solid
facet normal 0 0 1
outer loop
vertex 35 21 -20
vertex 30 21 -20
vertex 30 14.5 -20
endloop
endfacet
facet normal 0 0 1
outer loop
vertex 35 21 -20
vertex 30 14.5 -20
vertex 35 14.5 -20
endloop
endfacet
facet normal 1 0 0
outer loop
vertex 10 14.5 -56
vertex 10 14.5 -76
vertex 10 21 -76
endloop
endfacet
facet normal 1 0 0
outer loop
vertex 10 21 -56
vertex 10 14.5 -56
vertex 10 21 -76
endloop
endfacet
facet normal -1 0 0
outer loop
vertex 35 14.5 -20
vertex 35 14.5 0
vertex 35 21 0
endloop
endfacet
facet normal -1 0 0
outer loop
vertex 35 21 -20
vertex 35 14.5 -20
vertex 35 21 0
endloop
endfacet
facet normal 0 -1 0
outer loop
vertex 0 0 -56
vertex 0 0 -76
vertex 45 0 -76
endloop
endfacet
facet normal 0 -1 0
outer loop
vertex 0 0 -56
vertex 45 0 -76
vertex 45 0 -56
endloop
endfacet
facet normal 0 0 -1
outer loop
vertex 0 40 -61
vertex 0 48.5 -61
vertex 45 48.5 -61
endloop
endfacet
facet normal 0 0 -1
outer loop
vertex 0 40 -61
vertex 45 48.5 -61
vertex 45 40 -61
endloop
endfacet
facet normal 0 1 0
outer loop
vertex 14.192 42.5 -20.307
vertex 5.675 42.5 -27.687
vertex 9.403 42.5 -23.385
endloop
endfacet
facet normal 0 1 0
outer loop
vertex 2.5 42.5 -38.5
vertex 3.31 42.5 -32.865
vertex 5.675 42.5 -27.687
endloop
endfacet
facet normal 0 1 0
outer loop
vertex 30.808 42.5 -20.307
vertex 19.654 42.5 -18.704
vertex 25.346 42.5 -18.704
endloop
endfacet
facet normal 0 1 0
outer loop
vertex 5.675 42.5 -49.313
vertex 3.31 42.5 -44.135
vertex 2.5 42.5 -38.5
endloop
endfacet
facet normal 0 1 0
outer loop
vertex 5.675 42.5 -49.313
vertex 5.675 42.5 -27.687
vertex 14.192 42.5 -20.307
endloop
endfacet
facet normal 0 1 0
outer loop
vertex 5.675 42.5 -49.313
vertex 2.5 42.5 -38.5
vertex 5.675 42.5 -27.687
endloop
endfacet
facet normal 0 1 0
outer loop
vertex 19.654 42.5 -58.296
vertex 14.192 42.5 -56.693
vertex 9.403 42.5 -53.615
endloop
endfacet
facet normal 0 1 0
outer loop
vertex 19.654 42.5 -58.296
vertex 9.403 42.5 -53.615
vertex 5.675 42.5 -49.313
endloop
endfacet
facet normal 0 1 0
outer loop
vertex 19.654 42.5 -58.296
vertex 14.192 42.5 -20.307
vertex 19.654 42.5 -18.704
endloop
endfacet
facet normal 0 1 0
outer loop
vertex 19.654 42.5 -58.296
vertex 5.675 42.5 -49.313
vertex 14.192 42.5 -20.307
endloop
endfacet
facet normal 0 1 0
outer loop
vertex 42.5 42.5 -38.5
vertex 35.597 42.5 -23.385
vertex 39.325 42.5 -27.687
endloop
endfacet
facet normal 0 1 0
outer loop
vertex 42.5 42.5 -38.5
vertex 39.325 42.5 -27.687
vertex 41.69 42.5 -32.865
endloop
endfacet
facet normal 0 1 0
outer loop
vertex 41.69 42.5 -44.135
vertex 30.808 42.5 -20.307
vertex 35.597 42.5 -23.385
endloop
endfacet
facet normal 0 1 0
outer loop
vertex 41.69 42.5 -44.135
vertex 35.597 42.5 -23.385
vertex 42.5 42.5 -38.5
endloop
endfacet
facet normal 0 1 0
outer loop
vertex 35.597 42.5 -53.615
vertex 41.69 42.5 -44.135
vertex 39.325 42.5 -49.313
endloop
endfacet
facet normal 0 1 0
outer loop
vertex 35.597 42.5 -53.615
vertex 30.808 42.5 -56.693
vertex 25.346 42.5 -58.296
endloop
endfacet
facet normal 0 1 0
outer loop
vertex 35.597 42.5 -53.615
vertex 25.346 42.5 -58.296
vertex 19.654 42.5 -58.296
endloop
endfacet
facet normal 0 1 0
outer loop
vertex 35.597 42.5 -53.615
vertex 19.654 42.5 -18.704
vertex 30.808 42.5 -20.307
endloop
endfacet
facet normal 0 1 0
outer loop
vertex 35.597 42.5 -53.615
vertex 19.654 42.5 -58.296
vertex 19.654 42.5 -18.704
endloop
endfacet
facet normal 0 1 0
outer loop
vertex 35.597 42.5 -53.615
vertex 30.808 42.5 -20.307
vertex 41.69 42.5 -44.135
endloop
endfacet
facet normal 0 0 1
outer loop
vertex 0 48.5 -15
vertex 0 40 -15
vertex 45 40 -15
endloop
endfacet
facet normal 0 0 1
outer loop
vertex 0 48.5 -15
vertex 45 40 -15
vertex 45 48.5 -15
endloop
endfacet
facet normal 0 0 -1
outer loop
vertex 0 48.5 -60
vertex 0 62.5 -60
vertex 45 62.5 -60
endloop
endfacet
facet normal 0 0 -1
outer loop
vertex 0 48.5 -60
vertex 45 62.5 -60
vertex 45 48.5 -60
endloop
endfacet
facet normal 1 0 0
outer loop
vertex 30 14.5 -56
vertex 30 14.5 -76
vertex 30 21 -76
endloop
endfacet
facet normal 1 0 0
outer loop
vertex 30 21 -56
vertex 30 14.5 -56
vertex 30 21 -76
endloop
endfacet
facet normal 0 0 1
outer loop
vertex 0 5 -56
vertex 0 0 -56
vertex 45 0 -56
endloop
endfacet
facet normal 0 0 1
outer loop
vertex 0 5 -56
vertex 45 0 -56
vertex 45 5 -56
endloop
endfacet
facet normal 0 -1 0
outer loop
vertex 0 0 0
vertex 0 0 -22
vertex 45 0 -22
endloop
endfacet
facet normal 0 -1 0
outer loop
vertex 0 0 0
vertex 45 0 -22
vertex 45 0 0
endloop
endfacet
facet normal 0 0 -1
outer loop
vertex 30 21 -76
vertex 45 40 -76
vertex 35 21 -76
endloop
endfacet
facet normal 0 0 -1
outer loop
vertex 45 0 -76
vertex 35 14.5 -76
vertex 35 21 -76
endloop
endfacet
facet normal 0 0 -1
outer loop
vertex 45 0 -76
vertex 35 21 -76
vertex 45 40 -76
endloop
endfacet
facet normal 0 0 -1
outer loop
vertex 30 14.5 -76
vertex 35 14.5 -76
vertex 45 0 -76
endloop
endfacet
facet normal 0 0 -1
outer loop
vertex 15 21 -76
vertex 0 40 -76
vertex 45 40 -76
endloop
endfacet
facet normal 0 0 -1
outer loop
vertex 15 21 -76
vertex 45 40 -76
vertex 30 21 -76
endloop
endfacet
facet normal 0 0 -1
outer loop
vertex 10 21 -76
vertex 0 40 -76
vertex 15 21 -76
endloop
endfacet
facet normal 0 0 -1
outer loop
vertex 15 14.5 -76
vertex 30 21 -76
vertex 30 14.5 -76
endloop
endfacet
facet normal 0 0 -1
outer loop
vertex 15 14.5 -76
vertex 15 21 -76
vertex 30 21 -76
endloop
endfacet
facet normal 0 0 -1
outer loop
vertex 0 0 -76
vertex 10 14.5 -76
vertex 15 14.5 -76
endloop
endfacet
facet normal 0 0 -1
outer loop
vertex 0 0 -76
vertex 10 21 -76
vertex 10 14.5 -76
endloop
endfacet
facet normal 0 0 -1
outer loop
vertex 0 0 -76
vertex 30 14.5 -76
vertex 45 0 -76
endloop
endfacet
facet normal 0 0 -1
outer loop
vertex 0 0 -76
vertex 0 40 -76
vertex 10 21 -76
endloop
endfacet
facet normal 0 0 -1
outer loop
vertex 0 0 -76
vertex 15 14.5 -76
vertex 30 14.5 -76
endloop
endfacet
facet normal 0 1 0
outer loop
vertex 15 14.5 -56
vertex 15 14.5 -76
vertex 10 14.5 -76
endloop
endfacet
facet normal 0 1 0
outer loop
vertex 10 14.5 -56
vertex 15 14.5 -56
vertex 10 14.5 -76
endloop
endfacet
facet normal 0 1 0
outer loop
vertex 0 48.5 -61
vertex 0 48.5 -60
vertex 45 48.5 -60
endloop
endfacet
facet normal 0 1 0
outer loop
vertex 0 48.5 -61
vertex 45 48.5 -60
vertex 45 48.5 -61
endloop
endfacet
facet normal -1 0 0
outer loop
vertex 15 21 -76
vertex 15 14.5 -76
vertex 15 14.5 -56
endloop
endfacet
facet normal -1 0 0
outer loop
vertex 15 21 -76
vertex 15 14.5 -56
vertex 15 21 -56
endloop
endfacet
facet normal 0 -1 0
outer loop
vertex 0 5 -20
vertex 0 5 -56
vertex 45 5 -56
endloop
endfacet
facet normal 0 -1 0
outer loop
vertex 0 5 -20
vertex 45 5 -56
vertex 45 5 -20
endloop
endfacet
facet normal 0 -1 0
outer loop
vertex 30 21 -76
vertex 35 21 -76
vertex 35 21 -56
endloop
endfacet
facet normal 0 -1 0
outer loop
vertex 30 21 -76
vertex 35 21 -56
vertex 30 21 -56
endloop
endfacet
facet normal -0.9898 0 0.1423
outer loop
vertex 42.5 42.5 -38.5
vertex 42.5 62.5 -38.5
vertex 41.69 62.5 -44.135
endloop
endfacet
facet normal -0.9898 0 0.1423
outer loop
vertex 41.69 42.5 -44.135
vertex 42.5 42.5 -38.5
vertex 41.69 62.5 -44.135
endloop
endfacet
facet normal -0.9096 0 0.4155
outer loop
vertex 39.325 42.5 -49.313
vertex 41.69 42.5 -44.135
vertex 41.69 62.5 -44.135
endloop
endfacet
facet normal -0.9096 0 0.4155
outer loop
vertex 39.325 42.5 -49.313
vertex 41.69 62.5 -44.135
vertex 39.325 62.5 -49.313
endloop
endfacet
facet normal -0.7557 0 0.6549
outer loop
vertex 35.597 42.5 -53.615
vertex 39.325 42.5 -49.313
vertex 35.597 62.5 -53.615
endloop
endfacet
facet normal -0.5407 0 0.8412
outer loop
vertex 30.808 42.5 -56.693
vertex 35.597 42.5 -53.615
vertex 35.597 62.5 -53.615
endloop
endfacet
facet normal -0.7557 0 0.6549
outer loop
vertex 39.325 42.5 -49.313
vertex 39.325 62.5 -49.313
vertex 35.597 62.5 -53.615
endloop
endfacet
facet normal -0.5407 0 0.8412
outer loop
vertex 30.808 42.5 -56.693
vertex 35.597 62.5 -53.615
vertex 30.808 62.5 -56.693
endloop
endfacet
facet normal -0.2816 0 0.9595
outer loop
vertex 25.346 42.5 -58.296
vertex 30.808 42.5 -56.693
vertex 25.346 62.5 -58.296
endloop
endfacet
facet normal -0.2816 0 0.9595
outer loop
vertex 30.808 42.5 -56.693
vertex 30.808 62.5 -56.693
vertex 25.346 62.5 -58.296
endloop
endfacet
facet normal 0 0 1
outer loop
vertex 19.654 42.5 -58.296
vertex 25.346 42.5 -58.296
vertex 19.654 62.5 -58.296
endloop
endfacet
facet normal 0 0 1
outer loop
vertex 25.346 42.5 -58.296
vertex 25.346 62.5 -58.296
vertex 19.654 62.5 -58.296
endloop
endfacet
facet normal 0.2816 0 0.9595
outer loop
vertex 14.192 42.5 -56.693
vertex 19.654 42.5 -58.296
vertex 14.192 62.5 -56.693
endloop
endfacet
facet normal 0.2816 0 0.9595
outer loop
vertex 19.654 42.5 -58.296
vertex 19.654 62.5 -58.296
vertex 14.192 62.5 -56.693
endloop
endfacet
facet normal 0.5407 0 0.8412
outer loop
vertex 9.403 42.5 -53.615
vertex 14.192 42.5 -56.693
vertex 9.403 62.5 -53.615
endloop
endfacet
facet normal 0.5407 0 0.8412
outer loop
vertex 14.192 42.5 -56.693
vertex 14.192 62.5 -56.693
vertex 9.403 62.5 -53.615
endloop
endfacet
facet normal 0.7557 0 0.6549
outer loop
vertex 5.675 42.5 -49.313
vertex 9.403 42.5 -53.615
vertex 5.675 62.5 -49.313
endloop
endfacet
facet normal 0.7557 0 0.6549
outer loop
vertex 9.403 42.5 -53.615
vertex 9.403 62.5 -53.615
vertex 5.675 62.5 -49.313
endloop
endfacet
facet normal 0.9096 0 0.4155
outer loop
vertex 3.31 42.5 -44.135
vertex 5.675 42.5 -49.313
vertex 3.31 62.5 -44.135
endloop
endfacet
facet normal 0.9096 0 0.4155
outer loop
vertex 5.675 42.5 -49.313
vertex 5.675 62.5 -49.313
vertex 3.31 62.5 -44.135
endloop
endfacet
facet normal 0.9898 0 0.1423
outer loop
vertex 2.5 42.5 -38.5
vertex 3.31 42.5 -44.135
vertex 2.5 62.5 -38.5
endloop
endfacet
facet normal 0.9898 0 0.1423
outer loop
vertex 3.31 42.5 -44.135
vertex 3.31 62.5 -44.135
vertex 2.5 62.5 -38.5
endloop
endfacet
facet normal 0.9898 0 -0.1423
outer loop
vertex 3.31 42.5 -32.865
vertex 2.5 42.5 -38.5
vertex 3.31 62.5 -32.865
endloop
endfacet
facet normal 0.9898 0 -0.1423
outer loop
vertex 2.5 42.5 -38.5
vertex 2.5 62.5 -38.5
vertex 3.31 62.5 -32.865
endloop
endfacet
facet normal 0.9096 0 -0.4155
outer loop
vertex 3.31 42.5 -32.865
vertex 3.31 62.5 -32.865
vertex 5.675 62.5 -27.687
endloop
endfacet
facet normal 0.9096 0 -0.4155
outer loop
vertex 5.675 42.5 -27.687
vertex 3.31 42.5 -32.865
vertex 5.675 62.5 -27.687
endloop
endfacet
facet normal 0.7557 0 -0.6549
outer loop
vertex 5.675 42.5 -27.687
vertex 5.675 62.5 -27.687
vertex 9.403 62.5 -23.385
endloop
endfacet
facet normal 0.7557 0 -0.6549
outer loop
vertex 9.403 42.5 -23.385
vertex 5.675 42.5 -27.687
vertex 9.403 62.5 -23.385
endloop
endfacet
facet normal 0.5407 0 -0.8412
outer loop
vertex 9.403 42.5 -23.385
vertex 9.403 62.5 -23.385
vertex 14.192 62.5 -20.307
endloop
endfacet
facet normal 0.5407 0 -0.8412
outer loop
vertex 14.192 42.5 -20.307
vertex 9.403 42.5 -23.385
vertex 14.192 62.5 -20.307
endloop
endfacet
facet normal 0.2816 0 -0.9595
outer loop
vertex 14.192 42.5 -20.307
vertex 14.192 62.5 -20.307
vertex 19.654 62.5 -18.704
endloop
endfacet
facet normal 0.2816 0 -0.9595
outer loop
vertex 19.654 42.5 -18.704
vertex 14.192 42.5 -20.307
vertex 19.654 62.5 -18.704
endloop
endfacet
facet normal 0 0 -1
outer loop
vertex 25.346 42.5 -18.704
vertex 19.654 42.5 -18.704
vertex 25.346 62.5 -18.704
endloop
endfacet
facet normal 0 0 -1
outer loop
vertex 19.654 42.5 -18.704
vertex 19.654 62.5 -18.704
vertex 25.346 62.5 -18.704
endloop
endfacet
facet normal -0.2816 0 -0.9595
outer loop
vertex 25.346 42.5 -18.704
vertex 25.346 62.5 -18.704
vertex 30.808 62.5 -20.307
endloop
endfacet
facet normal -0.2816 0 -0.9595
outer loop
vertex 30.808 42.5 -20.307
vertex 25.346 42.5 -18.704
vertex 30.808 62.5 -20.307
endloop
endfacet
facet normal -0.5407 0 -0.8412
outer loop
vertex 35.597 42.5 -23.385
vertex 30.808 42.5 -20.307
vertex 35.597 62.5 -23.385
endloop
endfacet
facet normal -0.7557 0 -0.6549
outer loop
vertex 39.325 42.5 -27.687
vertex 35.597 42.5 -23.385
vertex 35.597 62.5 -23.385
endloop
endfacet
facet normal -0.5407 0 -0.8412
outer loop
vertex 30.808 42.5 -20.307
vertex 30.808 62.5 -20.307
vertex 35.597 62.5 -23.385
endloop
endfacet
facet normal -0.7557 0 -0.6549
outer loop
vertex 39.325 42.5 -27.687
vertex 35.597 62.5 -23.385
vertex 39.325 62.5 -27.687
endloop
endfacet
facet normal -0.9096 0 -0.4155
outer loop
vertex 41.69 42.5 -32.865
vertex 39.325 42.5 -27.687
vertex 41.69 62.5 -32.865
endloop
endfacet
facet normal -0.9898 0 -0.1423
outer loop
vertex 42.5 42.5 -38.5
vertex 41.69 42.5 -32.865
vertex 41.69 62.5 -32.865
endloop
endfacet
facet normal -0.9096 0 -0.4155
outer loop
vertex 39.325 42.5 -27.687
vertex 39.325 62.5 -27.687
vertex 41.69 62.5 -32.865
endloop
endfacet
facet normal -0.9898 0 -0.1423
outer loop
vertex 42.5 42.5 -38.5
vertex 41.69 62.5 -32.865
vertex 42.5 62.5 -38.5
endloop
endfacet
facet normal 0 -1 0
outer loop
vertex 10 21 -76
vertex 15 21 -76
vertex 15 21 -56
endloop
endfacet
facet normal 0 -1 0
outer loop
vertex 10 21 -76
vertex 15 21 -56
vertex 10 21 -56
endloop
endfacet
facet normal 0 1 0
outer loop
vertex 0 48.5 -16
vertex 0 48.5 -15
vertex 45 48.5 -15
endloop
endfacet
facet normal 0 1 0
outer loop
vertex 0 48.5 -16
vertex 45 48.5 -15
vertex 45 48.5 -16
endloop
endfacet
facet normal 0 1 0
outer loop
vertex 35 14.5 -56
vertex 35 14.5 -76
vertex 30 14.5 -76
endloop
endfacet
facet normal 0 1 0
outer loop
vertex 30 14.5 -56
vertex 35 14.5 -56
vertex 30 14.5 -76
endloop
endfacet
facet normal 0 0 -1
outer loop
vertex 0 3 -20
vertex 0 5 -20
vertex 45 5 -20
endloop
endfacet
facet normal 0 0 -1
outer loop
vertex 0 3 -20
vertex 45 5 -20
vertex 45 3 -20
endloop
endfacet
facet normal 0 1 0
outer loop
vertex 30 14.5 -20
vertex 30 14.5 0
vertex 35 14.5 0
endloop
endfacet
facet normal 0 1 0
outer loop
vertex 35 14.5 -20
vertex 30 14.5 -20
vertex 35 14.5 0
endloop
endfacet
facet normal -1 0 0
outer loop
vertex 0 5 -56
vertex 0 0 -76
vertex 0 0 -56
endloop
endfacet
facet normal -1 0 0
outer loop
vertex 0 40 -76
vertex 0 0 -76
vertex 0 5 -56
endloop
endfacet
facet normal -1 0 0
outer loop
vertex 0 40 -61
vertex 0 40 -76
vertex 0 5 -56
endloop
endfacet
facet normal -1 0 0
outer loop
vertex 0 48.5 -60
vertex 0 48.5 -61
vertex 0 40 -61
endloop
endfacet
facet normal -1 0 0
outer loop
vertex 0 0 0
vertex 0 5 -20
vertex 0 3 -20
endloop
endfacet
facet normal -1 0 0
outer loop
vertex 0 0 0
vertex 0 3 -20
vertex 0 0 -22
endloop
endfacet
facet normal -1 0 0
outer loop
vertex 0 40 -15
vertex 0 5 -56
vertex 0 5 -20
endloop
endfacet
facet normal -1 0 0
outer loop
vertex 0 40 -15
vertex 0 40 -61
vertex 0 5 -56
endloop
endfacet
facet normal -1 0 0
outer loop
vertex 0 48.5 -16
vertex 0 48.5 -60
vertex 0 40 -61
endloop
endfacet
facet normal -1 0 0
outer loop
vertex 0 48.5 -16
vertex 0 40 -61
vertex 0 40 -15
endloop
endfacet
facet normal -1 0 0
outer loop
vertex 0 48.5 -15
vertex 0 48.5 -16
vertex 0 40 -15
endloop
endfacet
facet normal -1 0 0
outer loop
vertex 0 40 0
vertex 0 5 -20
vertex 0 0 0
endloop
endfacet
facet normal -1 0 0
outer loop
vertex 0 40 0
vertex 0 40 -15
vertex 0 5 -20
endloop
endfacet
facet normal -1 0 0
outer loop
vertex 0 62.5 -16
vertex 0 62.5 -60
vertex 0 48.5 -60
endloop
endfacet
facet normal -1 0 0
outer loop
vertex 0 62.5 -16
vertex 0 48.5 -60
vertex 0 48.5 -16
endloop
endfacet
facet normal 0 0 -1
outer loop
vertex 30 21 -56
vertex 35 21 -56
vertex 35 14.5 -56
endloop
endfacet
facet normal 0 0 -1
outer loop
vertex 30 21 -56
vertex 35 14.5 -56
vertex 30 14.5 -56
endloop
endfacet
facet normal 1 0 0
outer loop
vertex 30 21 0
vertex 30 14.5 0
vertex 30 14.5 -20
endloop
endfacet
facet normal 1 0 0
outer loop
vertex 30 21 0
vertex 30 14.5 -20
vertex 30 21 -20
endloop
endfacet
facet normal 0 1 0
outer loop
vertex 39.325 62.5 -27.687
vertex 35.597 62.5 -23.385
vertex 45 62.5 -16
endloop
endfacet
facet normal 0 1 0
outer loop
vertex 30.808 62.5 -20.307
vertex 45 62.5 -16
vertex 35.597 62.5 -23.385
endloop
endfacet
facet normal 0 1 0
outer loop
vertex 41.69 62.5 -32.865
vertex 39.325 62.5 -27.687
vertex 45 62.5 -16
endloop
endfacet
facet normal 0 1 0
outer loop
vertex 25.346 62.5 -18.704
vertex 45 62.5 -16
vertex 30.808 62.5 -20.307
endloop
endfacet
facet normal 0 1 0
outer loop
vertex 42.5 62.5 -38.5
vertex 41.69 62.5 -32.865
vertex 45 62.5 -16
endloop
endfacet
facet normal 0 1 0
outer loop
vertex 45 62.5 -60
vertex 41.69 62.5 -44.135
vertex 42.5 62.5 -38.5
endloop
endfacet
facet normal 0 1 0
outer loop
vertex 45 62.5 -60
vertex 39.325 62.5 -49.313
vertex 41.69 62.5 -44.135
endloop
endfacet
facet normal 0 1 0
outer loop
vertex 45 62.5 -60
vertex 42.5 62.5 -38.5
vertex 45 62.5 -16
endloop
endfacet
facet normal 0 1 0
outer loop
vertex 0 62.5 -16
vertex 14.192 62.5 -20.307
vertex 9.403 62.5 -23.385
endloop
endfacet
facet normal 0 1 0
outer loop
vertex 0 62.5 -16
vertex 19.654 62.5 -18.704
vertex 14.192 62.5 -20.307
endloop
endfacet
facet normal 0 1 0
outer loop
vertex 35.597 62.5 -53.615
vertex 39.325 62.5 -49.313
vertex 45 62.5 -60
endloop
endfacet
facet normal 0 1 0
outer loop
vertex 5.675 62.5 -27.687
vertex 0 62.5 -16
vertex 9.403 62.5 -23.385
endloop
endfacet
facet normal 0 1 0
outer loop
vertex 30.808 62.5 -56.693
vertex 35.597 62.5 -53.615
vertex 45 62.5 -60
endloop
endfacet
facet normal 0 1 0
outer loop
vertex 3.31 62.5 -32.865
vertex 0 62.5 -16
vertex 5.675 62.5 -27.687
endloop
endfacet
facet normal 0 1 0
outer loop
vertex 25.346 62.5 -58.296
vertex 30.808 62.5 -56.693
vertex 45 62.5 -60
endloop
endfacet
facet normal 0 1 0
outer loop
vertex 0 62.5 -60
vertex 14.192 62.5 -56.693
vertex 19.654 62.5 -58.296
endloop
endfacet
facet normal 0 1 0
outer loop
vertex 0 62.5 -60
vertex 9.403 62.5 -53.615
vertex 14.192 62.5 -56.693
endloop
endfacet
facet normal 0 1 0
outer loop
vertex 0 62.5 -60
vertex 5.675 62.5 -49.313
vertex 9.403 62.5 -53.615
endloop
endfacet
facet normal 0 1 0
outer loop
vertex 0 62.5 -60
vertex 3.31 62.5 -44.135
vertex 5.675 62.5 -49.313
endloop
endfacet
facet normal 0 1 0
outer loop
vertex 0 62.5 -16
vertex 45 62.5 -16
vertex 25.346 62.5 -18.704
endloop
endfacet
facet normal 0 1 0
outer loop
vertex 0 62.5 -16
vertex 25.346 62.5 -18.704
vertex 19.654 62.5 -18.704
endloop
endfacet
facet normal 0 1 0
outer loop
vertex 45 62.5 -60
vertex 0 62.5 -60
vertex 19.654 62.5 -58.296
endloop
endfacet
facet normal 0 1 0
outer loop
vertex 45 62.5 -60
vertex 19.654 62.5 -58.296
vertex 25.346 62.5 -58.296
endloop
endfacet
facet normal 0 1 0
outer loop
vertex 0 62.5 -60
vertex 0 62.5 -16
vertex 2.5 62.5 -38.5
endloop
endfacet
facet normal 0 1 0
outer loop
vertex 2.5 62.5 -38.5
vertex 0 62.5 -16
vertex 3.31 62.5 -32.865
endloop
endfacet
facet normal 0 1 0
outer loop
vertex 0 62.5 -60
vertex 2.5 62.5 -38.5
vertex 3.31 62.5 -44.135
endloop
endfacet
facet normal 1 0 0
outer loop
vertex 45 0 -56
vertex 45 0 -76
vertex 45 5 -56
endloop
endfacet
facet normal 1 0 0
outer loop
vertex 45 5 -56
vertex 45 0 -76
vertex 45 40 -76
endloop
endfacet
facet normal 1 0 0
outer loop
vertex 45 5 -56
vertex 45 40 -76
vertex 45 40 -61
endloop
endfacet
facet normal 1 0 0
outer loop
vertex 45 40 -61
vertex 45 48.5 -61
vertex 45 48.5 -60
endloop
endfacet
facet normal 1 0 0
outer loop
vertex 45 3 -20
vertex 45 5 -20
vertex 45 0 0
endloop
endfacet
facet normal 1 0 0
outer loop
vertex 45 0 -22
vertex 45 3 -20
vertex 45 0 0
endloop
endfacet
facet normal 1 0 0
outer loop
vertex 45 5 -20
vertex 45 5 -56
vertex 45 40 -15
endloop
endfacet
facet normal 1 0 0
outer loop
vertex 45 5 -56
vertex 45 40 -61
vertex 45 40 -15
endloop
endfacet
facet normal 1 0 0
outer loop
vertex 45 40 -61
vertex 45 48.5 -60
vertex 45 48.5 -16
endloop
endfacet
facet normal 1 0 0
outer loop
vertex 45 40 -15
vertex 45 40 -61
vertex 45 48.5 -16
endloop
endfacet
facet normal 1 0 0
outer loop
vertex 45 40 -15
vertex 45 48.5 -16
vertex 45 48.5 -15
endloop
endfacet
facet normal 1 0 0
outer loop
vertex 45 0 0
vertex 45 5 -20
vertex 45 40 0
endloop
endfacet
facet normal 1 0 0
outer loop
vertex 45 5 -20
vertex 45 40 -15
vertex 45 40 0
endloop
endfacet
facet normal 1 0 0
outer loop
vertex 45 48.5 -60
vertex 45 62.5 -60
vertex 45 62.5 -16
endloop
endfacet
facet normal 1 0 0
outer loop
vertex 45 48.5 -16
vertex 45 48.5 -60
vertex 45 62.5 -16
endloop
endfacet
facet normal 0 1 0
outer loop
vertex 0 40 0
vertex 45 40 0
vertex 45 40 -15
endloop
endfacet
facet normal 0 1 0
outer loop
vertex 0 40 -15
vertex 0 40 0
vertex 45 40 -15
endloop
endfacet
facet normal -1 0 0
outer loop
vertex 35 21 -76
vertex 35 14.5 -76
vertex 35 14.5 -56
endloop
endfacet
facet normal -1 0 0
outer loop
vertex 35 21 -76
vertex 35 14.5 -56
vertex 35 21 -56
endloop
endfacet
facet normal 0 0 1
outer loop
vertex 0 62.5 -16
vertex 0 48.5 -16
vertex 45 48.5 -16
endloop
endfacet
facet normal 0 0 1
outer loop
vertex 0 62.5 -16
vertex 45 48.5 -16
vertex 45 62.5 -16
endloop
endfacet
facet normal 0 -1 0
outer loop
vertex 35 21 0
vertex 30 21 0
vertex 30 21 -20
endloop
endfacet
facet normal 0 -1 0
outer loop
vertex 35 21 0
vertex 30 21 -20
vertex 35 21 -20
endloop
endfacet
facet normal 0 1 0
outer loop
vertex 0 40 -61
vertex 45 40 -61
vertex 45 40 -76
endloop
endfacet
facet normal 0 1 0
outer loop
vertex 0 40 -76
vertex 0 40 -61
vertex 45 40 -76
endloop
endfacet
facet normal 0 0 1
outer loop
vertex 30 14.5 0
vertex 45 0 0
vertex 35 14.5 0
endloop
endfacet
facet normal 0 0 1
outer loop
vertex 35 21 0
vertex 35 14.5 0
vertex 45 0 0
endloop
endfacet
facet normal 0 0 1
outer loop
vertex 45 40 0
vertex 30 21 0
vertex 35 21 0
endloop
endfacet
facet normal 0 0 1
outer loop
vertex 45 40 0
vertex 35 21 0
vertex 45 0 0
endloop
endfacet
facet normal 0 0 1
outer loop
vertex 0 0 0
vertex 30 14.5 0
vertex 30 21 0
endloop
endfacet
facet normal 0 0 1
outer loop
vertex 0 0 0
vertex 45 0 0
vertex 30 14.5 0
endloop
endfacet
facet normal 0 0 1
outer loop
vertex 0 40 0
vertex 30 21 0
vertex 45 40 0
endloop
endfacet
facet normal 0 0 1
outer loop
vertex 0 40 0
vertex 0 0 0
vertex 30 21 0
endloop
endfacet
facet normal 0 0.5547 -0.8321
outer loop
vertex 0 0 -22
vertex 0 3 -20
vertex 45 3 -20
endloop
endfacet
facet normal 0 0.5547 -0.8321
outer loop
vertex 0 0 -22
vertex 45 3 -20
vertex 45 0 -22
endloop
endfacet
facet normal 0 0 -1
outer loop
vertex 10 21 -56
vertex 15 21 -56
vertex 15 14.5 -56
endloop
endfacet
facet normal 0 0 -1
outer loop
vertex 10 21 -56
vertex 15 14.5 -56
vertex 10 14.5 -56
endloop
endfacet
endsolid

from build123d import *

# Parameters (mm, degrees)
EXTRUDE_1_DEPTH     = 45
SKETCH_2_R          = 20
CUT_EXTRUDE_1_DEPTH = 20
SKETCH_3_W          = 5
SKETCH_3_H          = 6.5
CUT_EXTRUDE_2_DEPTH = 20
SKETCH_4_W          = 5
SKETCH_4_H          = 6.5
CUT_EXTRUDE_3_DEPTH = 20


with BuildPart() as part:
    # Эскиз1 → Бобышка-Вытянуть1 (new body)
    with BuildSketch(Plane(origin=(0, 0, 0), x_dir=(0, 0, -1), z_dir=(1, 0, 0))):
        Polygon((0, 0), (0, 40), (15, 40), (15, 48.5), (16, 48.5), (16, 62.5), (60, 62.5), (60, 48.5), (61, 48.5), (61, 40), (76, 40), (76, 0), (56, 0), (56, 5), (20, 5), (20, 3), (22, 0), align=None)
    extrude(amount=EXTRUDE_1_DEPTH)

    # Эскиз2 → Вырез-Вытянуть1 (cut)
    with BuildSketch(Plane(origin=(0, 62.5, 0), x_dir=(1, 0, 0), z_dir=(0, 1, 0))):
        with Locations((22.5, 38.5)):
            Circle(SKETCH_2_R)
    extrude(amount=-CUT_EXTRUDE_1_DEPTH, mode=Mode.SUBTRACT)

    # Эскиз3 → Вырез-Вытянуть2 (cut)
    with BuildSketch(Plane.XY):
        with Locations((32.5, 17.75)):
            Rectangle(SKETCH_3_W, SKETCH_3_H)
    extrude(amount=-CUT_EXTRUDE_2_DEPTH, mode=Mode.SUBTRACT)

    # Эскиз4 → Вырез-Вытянуть3 (cut)
    with BuildSketch(Plane(origin=(0, 0, -76), x_dir=(-1, 0, 0), z_dir=(0, 0, -1))):
        with Locations((-32.5, 17.75)):
            Rectangle(SKETCH_4_W, SKETCH_4_H)
        with Locations((-12.5, 17.75)):
            Rectangle(SKETCH_4_W, SKETCH_4_H)
    extrude(amount=-CUT_EXTRUDE_3_DEPTH, mode=Mode.SUBTRACT)


solid = part.part
